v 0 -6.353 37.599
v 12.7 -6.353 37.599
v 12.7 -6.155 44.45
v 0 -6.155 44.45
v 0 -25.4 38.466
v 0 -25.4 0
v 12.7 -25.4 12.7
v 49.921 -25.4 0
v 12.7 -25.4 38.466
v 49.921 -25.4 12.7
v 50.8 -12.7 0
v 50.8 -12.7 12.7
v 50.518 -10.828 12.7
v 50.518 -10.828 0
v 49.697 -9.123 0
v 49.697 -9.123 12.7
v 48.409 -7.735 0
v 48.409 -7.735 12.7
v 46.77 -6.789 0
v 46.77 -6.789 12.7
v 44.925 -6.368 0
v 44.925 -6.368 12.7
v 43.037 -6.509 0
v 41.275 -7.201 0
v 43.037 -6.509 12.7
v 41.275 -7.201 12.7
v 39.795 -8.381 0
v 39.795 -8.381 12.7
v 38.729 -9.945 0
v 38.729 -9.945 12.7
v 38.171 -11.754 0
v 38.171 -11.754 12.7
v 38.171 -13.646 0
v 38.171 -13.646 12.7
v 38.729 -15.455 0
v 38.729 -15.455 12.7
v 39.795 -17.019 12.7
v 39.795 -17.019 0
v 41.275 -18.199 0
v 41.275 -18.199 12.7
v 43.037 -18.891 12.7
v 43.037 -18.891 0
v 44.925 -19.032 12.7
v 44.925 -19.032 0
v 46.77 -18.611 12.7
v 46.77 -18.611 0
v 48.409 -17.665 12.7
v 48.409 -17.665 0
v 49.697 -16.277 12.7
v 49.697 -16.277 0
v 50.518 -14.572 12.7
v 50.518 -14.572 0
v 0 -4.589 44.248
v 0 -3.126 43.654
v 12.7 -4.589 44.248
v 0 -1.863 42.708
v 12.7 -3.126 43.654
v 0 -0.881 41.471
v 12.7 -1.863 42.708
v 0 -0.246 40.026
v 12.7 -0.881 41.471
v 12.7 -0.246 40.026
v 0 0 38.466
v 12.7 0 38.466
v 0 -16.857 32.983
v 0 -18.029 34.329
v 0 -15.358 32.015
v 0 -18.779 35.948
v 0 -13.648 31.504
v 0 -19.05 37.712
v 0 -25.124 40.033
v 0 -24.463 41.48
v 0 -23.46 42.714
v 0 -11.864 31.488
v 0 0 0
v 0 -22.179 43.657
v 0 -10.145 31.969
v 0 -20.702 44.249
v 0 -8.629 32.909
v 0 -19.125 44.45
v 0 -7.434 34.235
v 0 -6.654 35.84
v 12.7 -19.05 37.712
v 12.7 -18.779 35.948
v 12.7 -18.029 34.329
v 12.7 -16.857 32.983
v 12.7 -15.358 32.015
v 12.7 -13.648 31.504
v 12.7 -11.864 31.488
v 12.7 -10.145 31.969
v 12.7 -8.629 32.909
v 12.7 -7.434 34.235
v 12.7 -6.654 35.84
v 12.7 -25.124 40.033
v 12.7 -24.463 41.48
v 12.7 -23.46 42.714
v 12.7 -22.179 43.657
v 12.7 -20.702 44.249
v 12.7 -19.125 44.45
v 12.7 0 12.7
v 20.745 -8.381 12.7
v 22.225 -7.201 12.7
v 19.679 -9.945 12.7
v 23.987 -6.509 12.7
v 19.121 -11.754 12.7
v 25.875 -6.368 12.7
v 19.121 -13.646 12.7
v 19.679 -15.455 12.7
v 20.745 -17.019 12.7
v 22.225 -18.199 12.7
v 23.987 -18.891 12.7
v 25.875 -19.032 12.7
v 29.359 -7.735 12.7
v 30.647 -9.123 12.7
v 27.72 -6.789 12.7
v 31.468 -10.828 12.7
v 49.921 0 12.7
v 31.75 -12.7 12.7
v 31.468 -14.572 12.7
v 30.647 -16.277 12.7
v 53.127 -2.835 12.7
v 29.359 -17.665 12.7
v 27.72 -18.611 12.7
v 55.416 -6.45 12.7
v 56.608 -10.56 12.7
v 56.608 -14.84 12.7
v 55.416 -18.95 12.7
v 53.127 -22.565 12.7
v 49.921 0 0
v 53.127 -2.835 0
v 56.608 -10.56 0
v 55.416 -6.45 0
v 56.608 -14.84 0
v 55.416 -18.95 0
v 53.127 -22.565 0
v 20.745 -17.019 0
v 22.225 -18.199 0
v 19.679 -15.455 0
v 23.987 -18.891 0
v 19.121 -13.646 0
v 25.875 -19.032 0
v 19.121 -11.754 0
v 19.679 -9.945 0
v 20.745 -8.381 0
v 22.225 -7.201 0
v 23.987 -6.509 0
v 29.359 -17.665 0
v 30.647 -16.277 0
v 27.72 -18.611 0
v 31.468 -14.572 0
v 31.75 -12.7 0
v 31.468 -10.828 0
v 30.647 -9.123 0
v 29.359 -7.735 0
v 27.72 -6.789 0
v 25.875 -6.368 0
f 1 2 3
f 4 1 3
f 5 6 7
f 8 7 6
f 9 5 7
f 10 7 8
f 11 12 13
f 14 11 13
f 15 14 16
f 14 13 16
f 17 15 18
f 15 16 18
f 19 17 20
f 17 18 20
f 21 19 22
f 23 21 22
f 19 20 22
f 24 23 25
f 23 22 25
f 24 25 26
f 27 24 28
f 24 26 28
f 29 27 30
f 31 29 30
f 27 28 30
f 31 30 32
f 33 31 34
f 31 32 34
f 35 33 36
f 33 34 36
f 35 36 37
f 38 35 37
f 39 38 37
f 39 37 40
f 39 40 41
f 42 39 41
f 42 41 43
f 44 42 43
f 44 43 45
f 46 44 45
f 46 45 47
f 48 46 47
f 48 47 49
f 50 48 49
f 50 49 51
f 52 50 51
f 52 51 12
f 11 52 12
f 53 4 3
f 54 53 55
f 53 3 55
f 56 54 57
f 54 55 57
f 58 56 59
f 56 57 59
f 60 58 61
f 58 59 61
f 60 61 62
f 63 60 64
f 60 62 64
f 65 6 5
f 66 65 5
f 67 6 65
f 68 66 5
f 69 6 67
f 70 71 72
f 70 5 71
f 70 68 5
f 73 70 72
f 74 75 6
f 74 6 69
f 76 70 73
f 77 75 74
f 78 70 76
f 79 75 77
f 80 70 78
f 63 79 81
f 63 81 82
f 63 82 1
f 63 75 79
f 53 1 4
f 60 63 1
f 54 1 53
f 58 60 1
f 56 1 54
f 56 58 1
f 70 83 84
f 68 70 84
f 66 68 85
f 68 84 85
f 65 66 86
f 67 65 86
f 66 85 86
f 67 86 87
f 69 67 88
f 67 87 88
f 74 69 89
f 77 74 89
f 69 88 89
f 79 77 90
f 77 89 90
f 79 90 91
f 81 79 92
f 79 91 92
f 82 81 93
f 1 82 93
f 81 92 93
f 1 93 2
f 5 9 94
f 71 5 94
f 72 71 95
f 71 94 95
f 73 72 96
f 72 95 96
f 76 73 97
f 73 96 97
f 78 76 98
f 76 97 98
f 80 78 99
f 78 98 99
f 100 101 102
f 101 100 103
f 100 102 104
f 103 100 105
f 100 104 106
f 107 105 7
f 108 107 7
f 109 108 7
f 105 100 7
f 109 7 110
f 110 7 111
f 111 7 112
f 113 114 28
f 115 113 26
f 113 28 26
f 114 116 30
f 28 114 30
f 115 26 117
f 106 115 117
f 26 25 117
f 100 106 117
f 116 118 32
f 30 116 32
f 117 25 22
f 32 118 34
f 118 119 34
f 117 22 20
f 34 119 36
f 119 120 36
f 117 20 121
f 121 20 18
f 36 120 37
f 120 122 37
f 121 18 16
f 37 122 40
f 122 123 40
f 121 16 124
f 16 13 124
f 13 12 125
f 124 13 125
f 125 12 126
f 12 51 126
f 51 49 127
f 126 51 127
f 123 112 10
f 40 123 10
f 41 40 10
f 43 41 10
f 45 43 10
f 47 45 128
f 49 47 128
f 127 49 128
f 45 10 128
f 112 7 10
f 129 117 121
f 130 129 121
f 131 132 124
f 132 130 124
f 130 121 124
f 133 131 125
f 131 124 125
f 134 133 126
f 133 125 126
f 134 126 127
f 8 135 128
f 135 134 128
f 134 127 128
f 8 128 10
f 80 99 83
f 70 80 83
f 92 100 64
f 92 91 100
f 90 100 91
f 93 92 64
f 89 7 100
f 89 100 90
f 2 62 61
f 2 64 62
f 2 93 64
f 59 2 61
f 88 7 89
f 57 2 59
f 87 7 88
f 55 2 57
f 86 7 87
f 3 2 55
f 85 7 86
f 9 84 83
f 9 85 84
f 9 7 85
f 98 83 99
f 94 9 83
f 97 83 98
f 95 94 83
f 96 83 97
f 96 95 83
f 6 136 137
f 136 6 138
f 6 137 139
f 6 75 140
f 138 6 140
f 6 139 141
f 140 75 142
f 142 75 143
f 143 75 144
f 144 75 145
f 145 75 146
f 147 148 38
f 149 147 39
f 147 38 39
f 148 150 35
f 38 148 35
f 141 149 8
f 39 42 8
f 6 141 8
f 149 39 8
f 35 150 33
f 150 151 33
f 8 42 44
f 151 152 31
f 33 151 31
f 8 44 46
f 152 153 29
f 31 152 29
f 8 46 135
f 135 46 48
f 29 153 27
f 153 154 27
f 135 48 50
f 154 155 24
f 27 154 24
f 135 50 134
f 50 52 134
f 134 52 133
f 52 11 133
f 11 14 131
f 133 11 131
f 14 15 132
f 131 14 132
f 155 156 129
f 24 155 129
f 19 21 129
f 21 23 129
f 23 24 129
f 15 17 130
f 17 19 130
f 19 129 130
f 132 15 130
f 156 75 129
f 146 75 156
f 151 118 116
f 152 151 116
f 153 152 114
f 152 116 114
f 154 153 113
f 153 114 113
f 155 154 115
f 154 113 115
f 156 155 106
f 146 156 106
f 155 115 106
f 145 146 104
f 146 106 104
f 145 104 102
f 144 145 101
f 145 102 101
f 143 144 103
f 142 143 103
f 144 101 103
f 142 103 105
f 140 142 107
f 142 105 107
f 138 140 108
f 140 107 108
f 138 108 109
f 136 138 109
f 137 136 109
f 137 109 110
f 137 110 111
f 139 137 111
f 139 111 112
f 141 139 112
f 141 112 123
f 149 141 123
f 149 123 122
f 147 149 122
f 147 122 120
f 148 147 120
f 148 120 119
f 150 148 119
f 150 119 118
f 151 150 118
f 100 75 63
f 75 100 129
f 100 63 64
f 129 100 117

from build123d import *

# Parameters (mm, degrees)
F0_W      = 57.15
F0_H      = 44.45
F1_DEPTH  = 25.4
F2_W      = 44.45
F2_H      = 31.75
F3_DEPTH  = 25.4
F5_DEPTH  = 25.4
F7_DEPTH  = 25.4
F9_DEPTH  = 25.4
F10_R     = 6.35
F11_DEPTH = 25.4
F13_DEPTH = 25.4


with BuildPart() as f1:
    # F0 (on Front) → F1 (new body)
    with BuildSketch(Plane.XZ):
        with Locations((28.575, 22.225)):
            Rectangle(F0_W, F0_H)
    extrude(amount=F1_DEPTH)

    # F2 (on face) → F3 (cut)
    with BuildSketch(Plane.XZ.offset(25.4)):
        with Locations((34.925, 28.575)):
            Rectangle(F2_W, F2_H)
    extrude(amount=-F3_DEPTH, mode=Mode.SUBTRACT)

    # F4 (on face) → F5 (cut)
    with BuildSketch(Plane.YZ.offset(12.7)):
        with BuildLine():
            ThreePointArc((-19.049607, 37.71184), (-12.735329, 44.132399), (-6.35, 37.782498))
            ThreePointArc((-6.35, 37.782498), (-6.350663, 37.690749), (-6.352651, 37.59902))
            Line((-6.352651, 37.59902), (-6.154615, 44.45))
            Line((-6.154615, 44.45), (-19.124588, 44.45))
            Line((-19.124588, 44.45), (-19.049607, 37.71184))
        make_face()
        with BuildLine():
            ThreePointArc((-6.352651, 37.59902), (-6.350663, 37.690749), (-6.35, 37.782498))
            ThreePointArc((-6.35, 37.782498), (-12.735329, 44.132399), (-19.049607, 37.71184))
            ThreePointArc((-19.049607, 37.71184), (-12.756422, 31.432748), (-6.352651, 37.59902))
        make_face()
    extrude(amount=-F5_DEPTH, mode=Mode.SUBTRACT)

    # F6 (on face) → F7 (cut)
    with BuildSketch(Plane.YZ.offset(12.7)):
        with BuildLine():
            ThreePointArc((-25.4, 38.466346), (-23.46005, 42.71433), (-19.124588, 44.45))
            Line((-19.124588, 44.45), (-25.4, 44.45))
            Line((-25.4, 44.45), (-25.4, 38.466346))
        make_face()
    extrude(amount=-F7_DEPTH, mode=Mode.SUBTRACT)

    # F8 (on face) → F9 (cut)
    with BuildSketch(Plane.YZ.offset(12.7)):
        with BuildLine():
            ThreePointArc((-6.154615, 44.45), (-1.862663, 42.707521), (0, 38.466346))
            Line((0, 38.466346), (0, 44.45))
            Line((0, 44.45), (-6.154615, 44.45))
        make_face()
    extrude(amount=-F9_DEPTH, mode=Mode.SUBTRACT)

    # F10 (on face) → F11 (cut)
    with BuildSketch(Plane.XY.offset(12.7)):
        with Locations((44.45, -12.7)):
            Circle(F10_R)
        with Locations((25.4, -12.7)):
            Circle(F10_R)
    extrude(amount=-F11_DEPTH, mode=Mode.SUBTRACT)

    # F12 (on face) → F13 (cut)
    with BuildSketch(Plane.XY.offset(12.7)):
        with BuildLine():
            ThreePointArc((49.920771, 0), (56.759721, -12.7), (49.920771, -25.4))
            Line((49.920771, -25.4), (57.15, -25.4))
            Line((57.15, -25.4), (57.15, 0))
            Line((57.15, 0), (49.920771, 0))
        make_face()
    extrude(amount=-F13_DEPTH, mode=Mode.SUBTRACT)


solid = f1.part
